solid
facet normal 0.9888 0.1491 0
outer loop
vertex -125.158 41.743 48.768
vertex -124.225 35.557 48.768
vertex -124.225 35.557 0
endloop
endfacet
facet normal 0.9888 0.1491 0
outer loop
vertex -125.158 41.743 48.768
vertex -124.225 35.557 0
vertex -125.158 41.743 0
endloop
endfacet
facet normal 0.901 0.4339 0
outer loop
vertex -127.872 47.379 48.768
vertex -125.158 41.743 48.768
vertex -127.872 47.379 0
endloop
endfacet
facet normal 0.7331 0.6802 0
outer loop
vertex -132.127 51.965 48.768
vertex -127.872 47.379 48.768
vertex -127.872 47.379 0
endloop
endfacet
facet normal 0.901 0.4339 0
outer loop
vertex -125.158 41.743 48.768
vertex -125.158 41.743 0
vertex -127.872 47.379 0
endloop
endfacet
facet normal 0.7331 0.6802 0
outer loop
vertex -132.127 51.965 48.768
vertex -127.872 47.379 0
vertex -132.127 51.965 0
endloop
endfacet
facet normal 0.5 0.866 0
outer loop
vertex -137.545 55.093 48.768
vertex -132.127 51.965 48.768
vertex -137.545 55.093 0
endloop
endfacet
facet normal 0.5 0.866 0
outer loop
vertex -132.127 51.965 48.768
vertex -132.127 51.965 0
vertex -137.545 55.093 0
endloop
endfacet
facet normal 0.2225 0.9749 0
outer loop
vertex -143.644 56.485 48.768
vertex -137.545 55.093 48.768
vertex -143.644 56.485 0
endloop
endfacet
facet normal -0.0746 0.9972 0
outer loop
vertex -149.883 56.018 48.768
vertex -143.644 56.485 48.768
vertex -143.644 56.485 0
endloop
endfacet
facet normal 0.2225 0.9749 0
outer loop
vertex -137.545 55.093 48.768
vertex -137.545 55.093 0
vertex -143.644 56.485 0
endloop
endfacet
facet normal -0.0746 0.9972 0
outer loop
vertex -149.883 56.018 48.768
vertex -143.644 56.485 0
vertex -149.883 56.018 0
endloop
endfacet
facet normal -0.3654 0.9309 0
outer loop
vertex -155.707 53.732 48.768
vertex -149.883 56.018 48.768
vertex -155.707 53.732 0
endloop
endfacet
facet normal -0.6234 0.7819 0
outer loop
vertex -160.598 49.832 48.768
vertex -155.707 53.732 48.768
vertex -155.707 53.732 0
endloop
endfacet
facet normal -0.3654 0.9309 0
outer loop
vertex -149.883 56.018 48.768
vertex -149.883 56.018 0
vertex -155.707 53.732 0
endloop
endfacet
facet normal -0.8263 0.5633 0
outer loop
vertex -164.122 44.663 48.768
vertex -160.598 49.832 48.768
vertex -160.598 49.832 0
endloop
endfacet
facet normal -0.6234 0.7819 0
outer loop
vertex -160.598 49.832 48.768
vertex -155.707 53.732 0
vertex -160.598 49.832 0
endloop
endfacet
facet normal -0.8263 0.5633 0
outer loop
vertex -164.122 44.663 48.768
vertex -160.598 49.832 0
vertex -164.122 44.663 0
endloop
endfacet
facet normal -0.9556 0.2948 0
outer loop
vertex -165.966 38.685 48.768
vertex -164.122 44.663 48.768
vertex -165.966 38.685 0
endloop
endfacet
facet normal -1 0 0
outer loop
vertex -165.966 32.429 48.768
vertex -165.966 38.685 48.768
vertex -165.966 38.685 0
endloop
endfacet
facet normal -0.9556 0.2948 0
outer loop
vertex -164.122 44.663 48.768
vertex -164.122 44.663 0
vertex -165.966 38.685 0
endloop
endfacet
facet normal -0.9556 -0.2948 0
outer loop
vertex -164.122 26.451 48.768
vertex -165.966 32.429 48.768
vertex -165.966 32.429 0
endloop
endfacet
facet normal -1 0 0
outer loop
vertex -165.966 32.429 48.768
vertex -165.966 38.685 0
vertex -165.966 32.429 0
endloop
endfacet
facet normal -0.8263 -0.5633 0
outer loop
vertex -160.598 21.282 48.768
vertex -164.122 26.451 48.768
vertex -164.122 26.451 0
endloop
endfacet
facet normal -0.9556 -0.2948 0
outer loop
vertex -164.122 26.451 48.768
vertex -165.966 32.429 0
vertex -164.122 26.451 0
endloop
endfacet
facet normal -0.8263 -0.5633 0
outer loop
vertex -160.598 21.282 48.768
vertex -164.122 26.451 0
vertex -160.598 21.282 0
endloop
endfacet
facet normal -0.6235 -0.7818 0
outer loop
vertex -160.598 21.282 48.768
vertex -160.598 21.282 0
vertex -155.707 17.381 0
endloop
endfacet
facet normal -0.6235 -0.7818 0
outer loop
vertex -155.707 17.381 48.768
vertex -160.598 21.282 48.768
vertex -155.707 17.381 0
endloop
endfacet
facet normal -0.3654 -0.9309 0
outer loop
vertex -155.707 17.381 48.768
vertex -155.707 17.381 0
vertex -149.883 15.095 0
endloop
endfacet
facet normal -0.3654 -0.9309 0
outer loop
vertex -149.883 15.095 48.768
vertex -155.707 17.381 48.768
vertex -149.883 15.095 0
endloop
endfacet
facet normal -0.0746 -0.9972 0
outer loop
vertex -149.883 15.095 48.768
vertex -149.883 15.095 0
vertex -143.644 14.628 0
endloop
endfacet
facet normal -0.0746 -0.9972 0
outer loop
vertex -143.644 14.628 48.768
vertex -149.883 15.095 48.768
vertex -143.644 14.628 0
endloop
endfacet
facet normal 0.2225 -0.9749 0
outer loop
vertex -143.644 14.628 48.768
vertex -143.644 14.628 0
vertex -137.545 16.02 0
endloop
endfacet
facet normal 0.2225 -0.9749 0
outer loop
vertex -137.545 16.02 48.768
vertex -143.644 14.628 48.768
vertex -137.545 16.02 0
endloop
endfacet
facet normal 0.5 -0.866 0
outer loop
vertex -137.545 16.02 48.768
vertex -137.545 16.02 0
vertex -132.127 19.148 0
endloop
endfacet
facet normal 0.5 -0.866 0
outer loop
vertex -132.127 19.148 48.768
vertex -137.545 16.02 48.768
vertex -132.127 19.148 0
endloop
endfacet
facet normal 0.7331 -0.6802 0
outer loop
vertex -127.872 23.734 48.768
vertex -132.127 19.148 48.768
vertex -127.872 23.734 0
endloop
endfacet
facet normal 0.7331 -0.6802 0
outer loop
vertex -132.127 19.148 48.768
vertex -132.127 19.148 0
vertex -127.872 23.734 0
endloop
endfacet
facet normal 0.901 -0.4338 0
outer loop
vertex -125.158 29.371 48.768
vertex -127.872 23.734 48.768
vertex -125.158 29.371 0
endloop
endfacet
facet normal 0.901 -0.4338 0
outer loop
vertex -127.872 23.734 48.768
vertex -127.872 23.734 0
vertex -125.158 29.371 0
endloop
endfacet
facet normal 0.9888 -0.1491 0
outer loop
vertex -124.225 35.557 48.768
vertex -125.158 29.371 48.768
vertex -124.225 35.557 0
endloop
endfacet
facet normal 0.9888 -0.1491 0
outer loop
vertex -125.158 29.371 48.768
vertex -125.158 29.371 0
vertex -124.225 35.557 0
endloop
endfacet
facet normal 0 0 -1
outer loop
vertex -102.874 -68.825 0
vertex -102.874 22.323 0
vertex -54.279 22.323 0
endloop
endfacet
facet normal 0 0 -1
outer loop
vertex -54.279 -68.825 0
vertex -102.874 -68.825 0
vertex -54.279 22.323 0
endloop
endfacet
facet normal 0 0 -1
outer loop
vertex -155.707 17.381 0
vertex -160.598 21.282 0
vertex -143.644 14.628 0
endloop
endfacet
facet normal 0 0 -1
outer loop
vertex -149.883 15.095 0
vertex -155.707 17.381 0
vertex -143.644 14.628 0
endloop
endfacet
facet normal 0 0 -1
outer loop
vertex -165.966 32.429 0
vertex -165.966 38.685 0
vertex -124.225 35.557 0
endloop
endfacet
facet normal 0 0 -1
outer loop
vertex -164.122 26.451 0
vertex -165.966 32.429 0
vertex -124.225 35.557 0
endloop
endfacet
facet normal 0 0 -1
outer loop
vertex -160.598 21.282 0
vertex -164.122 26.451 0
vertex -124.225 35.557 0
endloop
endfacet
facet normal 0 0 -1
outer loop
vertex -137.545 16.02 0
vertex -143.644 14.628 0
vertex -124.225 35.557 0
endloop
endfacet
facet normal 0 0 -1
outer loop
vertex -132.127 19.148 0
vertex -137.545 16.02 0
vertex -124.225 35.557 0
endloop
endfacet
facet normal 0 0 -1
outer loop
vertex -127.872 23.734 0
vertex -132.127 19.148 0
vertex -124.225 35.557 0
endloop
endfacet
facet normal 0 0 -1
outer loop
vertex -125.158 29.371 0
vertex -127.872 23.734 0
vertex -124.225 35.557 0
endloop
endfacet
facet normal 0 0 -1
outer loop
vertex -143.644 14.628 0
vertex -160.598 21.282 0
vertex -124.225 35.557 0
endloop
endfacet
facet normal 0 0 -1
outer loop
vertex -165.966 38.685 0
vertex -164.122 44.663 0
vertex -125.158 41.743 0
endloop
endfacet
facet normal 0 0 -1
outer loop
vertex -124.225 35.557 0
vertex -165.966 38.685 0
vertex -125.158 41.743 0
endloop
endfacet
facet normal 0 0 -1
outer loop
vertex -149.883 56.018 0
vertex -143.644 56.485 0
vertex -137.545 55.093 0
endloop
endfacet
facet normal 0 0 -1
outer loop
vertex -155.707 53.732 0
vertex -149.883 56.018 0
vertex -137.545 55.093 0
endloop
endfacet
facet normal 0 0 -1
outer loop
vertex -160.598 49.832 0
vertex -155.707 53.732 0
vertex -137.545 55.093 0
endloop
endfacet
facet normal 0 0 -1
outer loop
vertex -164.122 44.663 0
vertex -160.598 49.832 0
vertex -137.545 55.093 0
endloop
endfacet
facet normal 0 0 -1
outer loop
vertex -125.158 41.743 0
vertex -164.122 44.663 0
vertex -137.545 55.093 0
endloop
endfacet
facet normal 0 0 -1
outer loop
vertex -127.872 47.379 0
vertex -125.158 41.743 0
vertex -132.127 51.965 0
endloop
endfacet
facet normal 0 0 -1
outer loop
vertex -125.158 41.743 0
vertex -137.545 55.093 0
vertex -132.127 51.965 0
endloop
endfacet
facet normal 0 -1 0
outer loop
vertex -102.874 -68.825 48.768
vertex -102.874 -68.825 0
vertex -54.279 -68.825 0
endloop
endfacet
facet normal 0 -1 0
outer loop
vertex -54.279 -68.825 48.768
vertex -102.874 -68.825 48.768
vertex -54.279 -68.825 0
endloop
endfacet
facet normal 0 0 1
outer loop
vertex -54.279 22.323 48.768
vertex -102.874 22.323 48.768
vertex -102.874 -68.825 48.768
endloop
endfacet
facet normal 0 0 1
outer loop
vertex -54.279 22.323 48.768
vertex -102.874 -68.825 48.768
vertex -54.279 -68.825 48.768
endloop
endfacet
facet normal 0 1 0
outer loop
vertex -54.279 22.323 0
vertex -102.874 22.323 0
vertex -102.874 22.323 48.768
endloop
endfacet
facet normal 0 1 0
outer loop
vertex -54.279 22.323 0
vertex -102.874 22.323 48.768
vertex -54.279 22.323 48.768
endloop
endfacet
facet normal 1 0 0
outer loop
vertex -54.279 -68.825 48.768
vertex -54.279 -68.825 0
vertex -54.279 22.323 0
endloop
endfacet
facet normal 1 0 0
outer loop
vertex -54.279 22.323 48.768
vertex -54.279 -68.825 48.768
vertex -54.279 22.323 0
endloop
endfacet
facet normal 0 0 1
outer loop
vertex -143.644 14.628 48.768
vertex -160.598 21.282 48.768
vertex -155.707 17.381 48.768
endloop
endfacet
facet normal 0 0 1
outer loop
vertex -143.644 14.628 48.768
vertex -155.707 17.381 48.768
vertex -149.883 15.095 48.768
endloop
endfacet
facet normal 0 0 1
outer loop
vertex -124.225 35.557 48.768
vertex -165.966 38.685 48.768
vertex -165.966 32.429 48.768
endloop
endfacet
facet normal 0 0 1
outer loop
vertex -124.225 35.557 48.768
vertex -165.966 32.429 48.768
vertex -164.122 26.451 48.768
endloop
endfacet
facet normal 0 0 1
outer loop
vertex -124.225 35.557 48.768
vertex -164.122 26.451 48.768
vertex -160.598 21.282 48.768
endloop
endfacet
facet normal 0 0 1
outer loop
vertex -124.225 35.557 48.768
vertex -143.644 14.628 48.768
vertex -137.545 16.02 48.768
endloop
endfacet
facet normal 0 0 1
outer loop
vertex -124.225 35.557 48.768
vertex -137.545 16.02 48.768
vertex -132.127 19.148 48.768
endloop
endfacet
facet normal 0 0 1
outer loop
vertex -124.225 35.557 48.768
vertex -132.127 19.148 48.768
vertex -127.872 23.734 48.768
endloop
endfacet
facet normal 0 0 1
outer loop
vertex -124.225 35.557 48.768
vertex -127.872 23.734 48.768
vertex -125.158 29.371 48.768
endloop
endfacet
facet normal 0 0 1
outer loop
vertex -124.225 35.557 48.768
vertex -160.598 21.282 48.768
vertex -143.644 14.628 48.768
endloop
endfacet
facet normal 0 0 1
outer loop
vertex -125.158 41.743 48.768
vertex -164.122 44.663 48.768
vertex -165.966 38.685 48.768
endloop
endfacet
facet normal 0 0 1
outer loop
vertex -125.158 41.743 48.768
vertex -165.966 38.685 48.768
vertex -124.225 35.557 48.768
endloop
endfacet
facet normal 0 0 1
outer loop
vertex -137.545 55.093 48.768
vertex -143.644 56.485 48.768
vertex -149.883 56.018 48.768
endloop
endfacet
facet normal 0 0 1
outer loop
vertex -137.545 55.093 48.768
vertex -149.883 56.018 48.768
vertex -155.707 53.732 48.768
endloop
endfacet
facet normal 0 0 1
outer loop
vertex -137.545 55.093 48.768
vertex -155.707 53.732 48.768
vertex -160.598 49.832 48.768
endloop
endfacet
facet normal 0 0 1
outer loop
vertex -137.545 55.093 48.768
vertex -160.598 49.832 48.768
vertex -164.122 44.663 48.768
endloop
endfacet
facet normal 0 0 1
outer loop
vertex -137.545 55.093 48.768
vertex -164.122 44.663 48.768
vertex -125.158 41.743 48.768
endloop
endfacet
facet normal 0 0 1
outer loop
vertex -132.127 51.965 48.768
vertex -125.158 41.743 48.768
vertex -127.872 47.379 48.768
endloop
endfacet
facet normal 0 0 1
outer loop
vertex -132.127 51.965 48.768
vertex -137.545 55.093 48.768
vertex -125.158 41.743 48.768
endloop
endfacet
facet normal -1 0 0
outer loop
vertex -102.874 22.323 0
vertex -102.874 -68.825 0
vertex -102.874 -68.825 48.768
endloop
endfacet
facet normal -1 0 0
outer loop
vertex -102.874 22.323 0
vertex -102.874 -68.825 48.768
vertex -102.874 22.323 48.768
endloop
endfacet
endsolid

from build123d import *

# Parameters (mm, degrees)
F0_R     = 20.987401
F0_W     = 48.595518
F0_H     = 91.148186
F1_DEPTH = 48.768


with BuildPart() as f1:
    # F0 (on Top) → F1 (new body)
    with BuildSketch(Plane.XY):
        with Locations((-145.212874, 35.556678)):
            Circle(F0_R)
        with Locations((-78.576557, -23.251353)):
            Rectangle(F0_W, F0_H)
    extrude(amount=F1_DEPTH)


solid = f1.part
